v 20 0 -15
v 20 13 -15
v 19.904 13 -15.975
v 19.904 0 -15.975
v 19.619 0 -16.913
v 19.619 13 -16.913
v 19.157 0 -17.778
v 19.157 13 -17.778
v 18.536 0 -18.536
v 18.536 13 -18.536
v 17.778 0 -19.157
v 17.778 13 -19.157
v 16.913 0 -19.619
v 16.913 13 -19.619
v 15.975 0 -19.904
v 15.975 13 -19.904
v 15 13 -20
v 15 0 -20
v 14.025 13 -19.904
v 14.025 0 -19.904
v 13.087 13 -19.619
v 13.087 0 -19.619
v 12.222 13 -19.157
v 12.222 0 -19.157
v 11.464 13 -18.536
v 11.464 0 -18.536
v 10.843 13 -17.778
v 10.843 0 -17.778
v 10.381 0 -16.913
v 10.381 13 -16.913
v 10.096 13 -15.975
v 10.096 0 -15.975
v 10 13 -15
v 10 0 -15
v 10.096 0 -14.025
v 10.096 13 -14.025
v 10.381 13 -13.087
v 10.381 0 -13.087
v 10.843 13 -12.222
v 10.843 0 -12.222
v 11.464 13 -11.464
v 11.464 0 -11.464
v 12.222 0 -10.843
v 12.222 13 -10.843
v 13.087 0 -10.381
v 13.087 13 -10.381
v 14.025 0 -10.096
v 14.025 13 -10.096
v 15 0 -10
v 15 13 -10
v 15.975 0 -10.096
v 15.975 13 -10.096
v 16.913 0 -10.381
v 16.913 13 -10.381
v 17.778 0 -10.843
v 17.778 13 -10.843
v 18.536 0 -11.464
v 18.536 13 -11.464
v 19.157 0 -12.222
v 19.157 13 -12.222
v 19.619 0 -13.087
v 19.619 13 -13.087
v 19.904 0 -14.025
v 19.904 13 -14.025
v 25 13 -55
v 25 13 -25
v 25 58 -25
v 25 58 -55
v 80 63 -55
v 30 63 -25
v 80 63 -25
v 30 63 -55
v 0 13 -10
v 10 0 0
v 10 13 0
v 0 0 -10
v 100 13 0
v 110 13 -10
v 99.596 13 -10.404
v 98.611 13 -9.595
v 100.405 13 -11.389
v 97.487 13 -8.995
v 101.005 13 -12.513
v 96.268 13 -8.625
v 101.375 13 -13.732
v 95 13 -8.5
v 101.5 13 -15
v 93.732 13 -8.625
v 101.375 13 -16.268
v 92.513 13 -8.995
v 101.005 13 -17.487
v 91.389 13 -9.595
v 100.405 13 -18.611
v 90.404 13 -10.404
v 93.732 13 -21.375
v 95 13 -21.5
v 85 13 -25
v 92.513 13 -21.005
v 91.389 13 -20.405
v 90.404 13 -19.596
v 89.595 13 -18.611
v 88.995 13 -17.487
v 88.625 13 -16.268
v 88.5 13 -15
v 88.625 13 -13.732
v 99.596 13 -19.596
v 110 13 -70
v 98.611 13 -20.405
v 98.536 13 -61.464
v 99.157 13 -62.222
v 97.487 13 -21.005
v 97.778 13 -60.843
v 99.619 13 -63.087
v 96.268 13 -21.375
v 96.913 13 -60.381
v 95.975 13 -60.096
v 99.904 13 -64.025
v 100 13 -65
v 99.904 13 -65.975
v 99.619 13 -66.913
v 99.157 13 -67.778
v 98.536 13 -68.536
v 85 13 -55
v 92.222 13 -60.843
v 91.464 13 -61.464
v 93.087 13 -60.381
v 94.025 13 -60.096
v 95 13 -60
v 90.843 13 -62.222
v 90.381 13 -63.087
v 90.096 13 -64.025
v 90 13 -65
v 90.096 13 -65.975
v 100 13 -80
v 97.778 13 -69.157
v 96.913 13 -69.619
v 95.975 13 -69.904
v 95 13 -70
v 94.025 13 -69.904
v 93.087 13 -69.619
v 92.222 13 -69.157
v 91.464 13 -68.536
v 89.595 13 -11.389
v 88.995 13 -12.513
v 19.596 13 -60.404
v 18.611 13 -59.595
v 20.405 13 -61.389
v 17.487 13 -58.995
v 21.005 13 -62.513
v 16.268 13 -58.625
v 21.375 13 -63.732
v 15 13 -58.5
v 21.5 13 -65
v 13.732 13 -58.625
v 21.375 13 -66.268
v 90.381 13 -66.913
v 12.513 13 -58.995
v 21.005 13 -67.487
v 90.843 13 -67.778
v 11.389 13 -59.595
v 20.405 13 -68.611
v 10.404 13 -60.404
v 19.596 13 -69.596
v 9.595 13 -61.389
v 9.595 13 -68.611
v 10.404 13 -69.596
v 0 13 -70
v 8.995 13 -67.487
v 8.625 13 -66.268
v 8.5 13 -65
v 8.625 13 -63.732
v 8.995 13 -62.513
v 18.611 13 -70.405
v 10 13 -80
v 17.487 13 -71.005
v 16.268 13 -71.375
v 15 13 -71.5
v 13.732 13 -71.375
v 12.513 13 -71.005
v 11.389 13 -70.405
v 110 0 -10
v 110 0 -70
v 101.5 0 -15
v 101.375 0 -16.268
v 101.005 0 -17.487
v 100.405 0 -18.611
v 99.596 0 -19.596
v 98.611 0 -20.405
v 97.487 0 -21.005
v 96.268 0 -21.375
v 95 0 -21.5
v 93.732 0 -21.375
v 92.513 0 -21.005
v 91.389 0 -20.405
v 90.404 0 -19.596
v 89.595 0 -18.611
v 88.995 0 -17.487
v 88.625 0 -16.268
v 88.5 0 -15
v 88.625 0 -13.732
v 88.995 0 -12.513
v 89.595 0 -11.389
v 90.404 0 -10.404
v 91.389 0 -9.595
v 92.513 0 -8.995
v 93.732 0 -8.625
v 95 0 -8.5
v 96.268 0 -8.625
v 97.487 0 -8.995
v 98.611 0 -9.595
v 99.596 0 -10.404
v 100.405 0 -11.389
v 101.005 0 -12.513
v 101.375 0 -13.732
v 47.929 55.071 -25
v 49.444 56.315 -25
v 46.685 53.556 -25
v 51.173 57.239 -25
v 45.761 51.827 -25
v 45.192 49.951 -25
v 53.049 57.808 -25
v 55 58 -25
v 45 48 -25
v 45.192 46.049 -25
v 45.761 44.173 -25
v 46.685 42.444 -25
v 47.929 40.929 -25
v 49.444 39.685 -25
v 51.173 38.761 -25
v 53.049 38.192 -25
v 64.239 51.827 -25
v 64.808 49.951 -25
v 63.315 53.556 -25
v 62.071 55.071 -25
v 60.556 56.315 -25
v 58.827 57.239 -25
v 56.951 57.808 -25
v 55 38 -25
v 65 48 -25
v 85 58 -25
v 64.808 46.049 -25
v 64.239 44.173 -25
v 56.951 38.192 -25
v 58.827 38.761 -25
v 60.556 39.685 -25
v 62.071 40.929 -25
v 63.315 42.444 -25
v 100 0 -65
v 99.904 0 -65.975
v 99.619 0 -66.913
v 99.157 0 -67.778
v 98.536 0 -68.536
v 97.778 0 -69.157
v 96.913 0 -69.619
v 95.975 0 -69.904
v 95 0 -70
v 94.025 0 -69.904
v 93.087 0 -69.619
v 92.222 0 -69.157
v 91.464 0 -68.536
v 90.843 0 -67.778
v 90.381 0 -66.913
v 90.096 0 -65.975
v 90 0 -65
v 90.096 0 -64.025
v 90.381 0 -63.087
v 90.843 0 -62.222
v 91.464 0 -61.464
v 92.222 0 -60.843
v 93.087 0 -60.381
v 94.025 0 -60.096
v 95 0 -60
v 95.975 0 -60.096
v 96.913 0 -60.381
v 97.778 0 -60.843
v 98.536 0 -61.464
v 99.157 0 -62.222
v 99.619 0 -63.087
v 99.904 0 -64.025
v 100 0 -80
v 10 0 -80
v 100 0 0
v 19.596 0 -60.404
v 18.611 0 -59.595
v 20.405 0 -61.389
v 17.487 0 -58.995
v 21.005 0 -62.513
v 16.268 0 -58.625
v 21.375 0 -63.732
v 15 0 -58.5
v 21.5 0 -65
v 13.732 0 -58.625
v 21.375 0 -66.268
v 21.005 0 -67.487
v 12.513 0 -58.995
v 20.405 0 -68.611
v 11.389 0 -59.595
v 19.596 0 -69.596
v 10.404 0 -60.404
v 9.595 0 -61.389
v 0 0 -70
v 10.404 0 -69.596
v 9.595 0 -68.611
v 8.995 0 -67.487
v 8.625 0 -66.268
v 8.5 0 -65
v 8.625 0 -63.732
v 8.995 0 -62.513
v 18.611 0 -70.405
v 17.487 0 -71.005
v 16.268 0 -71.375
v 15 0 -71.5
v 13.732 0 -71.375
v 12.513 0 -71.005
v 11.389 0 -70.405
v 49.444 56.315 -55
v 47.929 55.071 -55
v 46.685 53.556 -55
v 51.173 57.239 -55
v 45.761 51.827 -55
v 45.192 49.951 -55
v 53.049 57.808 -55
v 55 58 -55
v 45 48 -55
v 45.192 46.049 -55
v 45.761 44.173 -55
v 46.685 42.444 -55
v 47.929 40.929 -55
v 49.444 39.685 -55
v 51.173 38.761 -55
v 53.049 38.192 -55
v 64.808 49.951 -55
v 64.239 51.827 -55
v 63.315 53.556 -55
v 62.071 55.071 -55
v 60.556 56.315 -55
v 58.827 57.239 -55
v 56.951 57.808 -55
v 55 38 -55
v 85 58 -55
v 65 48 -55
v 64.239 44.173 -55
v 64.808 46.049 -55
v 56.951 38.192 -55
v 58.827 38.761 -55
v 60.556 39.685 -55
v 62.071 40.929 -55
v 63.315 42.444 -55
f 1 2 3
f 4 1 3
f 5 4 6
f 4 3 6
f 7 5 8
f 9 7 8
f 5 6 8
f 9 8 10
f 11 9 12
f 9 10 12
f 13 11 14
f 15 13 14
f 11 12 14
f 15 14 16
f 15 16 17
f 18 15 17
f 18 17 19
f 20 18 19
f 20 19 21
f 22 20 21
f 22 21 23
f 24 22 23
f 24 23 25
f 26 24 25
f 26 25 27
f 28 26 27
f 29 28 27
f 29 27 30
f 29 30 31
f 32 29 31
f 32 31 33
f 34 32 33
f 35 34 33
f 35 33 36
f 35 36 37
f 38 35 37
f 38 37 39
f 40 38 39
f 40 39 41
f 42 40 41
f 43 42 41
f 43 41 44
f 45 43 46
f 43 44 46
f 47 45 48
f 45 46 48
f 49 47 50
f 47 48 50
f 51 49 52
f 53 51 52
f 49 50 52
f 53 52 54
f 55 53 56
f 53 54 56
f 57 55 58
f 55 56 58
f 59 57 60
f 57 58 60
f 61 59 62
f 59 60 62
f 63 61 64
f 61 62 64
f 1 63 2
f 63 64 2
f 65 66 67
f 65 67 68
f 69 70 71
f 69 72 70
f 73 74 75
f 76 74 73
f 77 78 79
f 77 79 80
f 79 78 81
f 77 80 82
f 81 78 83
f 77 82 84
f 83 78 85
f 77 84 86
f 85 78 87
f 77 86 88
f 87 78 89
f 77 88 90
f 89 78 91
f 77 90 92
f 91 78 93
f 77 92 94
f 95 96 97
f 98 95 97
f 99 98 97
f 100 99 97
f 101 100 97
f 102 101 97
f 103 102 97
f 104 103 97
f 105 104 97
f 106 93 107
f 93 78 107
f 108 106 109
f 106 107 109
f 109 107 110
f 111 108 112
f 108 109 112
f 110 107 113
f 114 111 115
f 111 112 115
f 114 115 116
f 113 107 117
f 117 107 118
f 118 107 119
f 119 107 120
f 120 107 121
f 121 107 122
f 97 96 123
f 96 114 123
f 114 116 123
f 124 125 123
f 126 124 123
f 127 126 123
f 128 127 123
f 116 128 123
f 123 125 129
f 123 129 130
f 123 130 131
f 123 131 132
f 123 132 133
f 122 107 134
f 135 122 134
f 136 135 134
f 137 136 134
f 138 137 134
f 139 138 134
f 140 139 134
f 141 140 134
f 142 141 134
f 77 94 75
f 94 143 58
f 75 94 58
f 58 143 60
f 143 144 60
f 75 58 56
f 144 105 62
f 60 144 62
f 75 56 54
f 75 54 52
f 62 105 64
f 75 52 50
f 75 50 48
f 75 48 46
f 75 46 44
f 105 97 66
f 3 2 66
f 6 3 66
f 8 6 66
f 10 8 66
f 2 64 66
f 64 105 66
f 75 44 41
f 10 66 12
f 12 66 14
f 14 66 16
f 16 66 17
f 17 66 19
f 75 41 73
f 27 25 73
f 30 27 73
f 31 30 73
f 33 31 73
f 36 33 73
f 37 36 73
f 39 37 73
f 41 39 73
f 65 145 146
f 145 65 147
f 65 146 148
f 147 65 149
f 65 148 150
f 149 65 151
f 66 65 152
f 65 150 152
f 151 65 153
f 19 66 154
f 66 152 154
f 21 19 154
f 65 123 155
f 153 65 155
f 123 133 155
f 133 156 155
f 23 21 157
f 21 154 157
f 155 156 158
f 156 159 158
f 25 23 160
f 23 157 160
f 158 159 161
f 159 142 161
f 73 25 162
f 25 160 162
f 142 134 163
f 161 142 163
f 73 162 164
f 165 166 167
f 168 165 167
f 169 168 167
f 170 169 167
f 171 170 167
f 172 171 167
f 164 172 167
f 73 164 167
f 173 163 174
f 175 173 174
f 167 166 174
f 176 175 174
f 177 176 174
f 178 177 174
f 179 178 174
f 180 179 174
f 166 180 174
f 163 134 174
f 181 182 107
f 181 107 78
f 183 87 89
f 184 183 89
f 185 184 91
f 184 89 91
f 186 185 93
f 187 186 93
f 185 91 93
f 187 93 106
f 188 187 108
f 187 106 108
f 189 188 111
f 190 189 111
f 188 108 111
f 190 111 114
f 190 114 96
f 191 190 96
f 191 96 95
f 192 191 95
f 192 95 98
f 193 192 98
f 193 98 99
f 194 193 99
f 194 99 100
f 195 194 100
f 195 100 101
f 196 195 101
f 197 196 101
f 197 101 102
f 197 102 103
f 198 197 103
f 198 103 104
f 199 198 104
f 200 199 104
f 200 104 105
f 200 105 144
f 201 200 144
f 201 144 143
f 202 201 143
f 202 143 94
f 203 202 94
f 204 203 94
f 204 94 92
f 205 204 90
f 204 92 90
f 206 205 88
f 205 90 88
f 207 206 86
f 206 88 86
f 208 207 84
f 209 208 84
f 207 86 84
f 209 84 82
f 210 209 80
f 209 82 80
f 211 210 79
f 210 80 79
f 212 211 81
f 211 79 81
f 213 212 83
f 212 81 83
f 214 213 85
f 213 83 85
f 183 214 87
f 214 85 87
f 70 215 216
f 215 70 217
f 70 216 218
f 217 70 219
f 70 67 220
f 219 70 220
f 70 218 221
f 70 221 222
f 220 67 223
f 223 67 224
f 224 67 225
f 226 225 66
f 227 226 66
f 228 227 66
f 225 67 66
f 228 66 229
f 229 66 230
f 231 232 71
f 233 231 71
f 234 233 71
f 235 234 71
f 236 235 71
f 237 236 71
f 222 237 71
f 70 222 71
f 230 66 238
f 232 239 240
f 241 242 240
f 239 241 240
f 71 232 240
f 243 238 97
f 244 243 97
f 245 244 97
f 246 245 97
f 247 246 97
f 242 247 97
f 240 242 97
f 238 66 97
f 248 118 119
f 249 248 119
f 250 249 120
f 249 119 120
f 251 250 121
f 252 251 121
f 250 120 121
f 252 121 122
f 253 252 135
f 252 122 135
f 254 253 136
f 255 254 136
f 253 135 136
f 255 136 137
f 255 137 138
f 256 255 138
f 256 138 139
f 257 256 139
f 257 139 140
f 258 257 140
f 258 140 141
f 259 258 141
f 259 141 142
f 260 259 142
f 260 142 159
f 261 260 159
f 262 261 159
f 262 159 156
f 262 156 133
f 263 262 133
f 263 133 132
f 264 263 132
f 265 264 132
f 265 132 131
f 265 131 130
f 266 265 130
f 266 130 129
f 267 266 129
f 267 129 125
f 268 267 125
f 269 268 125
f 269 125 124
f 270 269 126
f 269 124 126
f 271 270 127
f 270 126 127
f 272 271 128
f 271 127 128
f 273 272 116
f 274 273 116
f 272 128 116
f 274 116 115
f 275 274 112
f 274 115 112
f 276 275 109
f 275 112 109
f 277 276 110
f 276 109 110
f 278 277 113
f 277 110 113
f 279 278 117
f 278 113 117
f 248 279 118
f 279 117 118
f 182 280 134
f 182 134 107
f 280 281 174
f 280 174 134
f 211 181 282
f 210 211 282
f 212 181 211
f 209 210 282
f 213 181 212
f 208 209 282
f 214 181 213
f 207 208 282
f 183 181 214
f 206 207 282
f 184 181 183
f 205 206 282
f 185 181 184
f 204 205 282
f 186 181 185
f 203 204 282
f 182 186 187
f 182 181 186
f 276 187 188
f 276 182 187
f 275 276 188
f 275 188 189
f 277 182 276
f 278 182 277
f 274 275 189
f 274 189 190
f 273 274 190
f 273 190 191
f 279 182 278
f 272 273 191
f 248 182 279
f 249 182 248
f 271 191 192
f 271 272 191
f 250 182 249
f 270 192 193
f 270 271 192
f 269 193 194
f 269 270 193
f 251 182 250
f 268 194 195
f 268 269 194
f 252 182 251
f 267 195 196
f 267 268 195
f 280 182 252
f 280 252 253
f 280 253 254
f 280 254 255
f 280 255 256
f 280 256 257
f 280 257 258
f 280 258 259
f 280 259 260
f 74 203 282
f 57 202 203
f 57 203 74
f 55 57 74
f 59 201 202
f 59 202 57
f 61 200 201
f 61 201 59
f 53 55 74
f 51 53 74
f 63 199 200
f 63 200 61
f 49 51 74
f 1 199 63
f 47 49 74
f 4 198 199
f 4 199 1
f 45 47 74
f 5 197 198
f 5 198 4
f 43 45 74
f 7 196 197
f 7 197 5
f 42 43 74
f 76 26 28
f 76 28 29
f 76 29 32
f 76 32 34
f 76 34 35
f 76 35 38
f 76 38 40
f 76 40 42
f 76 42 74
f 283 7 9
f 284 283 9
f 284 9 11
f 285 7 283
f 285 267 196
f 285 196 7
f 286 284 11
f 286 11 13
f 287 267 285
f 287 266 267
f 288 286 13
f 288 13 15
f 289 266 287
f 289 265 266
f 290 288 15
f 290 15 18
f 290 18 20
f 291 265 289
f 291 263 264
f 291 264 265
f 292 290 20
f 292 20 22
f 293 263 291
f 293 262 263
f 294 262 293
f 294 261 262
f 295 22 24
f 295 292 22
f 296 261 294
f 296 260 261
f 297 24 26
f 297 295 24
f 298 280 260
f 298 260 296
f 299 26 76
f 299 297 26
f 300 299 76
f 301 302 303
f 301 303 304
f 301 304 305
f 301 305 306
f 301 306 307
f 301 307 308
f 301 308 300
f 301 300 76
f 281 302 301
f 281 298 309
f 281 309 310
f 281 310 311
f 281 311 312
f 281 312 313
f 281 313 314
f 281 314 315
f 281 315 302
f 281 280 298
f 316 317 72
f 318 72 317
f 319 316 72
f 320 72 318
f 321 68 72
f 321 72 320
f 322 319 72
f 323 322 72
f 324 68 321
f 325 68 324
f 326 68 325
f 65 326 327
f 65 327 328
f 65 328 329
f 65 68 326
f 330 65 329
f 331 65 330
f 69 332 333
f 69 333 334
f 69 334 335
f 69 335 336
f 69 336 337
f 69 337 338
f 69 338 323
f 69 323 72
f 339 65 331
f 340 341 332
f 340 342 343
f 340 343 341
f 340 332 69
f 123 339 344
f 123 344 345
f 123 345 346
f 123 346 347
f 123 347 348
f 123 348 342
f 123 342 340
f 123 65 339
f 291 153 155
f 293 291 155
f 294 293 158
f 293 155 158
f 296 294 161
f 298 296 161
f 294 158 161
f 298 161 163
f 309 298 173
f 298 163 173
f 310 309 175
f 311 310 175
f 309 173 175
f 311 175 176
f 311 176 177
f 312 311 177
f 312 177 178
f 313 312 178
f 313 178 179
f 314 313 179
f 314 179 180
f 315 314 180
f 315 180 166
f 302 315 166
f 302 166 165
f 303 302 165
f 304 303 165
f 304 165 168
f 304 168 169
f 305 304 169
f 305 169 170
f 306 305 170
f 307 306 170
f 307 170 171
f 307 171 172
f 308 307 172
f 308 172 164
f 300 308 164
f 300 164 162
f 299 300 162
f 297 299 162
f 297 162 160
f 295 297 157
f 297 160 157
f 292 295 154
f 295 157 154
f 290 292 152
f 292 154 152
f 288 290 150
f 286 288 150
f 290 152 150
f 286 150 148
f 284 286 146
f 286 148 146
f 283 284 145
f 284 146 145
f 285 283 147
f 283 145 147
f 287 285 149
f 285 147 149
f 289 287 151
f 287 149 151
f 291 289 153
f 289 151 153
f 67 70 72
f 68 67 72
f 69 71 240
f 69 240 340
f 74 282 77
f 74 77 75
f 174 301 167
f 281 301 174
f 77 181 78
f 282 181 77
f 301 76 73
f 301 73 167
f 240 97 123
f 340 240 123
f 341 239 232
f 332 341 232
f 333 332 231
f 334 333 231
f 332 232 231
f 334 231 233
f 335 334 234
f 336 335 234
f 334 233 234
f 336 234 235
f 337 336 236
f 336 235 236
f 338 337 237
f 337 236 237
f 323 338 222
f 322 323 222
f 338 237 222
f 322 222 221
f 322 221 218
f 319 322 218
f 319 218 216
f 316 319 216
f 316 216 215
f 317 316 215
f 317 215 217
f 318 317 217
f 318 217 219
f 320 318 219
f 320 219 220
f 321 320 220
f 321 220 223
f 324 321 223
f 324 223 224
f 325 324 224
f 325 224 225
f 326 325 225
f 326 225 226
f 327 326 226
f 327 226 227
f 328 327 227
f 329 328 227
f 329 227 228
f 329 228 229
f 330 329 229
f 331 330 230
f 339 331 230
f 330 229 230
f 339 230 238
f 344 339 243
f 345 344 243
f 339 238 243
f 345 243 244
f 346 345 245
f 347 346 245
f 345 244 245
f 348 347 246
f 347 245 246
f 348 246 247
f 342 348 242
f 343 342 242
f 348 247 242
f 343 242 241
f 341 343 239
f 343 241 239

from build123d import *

# Parameters (mm, degrees)
EXTRUDE_1_DEPTH     = 13
SKETCH_3_W          = 60
SKETCH_3_H          = 30
EXTRUDE_2_DEPTH     = 50
CHAMFER_1_SIZE      = 5
SKETCH_4_R          = 6.5
SKETCH_4_R_2        = 5
CUT_EXTRUDE_1_DEPTH = 50
SKETCH_5_R          = 10
CUT_EXTRUDE_2_DEPTH = 50


with BuildPart() as part:
    # Эскиз1 → Бобышка-Вытянуть1 (new body)
    with BuildSketch(Plane(origin=(0, 0, 0), x_dir=(1, 0, 0), z_dir=(0, 1, 0))):
        Polygon((0, 70), (10, 80), (100, 80), (110, 70), (110, 10), (100, 0), (10, 0), (0, 10), align=None)
    extrude(amount=EXTRUDE_1_DEPTH)

    # Эскиз3 → Бобышка-Вытянуть2 (add)
    with BuildSketch(Plane(origin=(0, 13, 0), x_dir=(1, 0, 0), z_dir=(0, 1, 0))):
        with Locations((55, 40)):
            Rectangle(SKETCH_3_W, SKETCH_3_H)
    extrude(amount=EXTRUDE_2_DEPTH)

    # Фаска1
    chamfer_1_edges = [part.edges().sort_by_distance(p)[0] for p in [
        (25, 63, -40),
        (85, 63, -40),
    ]]
    chamfer(chamfer_1_edges, length=CHAMFER_1_SIZE)

    # Эскиз4 → Вырез-Вытянуть1 (cut)
    with BuildSketch(Plane(origin=(0, 13, 0), x_dir=(1, 0, 0), z_dir=(0, 1, 0))):
        with Locations((15, 65)):
            Circle(SKETCH_4_R)
        with Locations((95, 15)):
            Circle(SKETCH_4_R)
        with Locations((95, 65)):
            Circle(SKETCH_4_R_2)
        with Locations((15, 15)):
            Circle(SKETCH_4_R_2)
    extrude(amount=-CUT_EXTRUDE_1_DEPTH, mode=Mode.SUBTRACT)

    # Эскиз5 → Вырез-Вытянуть2 (cut)
    with BuildSketch(Plane.XY.offset(-25)):
        with Locations((55, 48)):
            Circle(SKETCH_5_R)
    extrude(amount=-CUT_EXTRUDE_2_DEPTH, mode=Mode.SUBTRACT)


solid = part.part
